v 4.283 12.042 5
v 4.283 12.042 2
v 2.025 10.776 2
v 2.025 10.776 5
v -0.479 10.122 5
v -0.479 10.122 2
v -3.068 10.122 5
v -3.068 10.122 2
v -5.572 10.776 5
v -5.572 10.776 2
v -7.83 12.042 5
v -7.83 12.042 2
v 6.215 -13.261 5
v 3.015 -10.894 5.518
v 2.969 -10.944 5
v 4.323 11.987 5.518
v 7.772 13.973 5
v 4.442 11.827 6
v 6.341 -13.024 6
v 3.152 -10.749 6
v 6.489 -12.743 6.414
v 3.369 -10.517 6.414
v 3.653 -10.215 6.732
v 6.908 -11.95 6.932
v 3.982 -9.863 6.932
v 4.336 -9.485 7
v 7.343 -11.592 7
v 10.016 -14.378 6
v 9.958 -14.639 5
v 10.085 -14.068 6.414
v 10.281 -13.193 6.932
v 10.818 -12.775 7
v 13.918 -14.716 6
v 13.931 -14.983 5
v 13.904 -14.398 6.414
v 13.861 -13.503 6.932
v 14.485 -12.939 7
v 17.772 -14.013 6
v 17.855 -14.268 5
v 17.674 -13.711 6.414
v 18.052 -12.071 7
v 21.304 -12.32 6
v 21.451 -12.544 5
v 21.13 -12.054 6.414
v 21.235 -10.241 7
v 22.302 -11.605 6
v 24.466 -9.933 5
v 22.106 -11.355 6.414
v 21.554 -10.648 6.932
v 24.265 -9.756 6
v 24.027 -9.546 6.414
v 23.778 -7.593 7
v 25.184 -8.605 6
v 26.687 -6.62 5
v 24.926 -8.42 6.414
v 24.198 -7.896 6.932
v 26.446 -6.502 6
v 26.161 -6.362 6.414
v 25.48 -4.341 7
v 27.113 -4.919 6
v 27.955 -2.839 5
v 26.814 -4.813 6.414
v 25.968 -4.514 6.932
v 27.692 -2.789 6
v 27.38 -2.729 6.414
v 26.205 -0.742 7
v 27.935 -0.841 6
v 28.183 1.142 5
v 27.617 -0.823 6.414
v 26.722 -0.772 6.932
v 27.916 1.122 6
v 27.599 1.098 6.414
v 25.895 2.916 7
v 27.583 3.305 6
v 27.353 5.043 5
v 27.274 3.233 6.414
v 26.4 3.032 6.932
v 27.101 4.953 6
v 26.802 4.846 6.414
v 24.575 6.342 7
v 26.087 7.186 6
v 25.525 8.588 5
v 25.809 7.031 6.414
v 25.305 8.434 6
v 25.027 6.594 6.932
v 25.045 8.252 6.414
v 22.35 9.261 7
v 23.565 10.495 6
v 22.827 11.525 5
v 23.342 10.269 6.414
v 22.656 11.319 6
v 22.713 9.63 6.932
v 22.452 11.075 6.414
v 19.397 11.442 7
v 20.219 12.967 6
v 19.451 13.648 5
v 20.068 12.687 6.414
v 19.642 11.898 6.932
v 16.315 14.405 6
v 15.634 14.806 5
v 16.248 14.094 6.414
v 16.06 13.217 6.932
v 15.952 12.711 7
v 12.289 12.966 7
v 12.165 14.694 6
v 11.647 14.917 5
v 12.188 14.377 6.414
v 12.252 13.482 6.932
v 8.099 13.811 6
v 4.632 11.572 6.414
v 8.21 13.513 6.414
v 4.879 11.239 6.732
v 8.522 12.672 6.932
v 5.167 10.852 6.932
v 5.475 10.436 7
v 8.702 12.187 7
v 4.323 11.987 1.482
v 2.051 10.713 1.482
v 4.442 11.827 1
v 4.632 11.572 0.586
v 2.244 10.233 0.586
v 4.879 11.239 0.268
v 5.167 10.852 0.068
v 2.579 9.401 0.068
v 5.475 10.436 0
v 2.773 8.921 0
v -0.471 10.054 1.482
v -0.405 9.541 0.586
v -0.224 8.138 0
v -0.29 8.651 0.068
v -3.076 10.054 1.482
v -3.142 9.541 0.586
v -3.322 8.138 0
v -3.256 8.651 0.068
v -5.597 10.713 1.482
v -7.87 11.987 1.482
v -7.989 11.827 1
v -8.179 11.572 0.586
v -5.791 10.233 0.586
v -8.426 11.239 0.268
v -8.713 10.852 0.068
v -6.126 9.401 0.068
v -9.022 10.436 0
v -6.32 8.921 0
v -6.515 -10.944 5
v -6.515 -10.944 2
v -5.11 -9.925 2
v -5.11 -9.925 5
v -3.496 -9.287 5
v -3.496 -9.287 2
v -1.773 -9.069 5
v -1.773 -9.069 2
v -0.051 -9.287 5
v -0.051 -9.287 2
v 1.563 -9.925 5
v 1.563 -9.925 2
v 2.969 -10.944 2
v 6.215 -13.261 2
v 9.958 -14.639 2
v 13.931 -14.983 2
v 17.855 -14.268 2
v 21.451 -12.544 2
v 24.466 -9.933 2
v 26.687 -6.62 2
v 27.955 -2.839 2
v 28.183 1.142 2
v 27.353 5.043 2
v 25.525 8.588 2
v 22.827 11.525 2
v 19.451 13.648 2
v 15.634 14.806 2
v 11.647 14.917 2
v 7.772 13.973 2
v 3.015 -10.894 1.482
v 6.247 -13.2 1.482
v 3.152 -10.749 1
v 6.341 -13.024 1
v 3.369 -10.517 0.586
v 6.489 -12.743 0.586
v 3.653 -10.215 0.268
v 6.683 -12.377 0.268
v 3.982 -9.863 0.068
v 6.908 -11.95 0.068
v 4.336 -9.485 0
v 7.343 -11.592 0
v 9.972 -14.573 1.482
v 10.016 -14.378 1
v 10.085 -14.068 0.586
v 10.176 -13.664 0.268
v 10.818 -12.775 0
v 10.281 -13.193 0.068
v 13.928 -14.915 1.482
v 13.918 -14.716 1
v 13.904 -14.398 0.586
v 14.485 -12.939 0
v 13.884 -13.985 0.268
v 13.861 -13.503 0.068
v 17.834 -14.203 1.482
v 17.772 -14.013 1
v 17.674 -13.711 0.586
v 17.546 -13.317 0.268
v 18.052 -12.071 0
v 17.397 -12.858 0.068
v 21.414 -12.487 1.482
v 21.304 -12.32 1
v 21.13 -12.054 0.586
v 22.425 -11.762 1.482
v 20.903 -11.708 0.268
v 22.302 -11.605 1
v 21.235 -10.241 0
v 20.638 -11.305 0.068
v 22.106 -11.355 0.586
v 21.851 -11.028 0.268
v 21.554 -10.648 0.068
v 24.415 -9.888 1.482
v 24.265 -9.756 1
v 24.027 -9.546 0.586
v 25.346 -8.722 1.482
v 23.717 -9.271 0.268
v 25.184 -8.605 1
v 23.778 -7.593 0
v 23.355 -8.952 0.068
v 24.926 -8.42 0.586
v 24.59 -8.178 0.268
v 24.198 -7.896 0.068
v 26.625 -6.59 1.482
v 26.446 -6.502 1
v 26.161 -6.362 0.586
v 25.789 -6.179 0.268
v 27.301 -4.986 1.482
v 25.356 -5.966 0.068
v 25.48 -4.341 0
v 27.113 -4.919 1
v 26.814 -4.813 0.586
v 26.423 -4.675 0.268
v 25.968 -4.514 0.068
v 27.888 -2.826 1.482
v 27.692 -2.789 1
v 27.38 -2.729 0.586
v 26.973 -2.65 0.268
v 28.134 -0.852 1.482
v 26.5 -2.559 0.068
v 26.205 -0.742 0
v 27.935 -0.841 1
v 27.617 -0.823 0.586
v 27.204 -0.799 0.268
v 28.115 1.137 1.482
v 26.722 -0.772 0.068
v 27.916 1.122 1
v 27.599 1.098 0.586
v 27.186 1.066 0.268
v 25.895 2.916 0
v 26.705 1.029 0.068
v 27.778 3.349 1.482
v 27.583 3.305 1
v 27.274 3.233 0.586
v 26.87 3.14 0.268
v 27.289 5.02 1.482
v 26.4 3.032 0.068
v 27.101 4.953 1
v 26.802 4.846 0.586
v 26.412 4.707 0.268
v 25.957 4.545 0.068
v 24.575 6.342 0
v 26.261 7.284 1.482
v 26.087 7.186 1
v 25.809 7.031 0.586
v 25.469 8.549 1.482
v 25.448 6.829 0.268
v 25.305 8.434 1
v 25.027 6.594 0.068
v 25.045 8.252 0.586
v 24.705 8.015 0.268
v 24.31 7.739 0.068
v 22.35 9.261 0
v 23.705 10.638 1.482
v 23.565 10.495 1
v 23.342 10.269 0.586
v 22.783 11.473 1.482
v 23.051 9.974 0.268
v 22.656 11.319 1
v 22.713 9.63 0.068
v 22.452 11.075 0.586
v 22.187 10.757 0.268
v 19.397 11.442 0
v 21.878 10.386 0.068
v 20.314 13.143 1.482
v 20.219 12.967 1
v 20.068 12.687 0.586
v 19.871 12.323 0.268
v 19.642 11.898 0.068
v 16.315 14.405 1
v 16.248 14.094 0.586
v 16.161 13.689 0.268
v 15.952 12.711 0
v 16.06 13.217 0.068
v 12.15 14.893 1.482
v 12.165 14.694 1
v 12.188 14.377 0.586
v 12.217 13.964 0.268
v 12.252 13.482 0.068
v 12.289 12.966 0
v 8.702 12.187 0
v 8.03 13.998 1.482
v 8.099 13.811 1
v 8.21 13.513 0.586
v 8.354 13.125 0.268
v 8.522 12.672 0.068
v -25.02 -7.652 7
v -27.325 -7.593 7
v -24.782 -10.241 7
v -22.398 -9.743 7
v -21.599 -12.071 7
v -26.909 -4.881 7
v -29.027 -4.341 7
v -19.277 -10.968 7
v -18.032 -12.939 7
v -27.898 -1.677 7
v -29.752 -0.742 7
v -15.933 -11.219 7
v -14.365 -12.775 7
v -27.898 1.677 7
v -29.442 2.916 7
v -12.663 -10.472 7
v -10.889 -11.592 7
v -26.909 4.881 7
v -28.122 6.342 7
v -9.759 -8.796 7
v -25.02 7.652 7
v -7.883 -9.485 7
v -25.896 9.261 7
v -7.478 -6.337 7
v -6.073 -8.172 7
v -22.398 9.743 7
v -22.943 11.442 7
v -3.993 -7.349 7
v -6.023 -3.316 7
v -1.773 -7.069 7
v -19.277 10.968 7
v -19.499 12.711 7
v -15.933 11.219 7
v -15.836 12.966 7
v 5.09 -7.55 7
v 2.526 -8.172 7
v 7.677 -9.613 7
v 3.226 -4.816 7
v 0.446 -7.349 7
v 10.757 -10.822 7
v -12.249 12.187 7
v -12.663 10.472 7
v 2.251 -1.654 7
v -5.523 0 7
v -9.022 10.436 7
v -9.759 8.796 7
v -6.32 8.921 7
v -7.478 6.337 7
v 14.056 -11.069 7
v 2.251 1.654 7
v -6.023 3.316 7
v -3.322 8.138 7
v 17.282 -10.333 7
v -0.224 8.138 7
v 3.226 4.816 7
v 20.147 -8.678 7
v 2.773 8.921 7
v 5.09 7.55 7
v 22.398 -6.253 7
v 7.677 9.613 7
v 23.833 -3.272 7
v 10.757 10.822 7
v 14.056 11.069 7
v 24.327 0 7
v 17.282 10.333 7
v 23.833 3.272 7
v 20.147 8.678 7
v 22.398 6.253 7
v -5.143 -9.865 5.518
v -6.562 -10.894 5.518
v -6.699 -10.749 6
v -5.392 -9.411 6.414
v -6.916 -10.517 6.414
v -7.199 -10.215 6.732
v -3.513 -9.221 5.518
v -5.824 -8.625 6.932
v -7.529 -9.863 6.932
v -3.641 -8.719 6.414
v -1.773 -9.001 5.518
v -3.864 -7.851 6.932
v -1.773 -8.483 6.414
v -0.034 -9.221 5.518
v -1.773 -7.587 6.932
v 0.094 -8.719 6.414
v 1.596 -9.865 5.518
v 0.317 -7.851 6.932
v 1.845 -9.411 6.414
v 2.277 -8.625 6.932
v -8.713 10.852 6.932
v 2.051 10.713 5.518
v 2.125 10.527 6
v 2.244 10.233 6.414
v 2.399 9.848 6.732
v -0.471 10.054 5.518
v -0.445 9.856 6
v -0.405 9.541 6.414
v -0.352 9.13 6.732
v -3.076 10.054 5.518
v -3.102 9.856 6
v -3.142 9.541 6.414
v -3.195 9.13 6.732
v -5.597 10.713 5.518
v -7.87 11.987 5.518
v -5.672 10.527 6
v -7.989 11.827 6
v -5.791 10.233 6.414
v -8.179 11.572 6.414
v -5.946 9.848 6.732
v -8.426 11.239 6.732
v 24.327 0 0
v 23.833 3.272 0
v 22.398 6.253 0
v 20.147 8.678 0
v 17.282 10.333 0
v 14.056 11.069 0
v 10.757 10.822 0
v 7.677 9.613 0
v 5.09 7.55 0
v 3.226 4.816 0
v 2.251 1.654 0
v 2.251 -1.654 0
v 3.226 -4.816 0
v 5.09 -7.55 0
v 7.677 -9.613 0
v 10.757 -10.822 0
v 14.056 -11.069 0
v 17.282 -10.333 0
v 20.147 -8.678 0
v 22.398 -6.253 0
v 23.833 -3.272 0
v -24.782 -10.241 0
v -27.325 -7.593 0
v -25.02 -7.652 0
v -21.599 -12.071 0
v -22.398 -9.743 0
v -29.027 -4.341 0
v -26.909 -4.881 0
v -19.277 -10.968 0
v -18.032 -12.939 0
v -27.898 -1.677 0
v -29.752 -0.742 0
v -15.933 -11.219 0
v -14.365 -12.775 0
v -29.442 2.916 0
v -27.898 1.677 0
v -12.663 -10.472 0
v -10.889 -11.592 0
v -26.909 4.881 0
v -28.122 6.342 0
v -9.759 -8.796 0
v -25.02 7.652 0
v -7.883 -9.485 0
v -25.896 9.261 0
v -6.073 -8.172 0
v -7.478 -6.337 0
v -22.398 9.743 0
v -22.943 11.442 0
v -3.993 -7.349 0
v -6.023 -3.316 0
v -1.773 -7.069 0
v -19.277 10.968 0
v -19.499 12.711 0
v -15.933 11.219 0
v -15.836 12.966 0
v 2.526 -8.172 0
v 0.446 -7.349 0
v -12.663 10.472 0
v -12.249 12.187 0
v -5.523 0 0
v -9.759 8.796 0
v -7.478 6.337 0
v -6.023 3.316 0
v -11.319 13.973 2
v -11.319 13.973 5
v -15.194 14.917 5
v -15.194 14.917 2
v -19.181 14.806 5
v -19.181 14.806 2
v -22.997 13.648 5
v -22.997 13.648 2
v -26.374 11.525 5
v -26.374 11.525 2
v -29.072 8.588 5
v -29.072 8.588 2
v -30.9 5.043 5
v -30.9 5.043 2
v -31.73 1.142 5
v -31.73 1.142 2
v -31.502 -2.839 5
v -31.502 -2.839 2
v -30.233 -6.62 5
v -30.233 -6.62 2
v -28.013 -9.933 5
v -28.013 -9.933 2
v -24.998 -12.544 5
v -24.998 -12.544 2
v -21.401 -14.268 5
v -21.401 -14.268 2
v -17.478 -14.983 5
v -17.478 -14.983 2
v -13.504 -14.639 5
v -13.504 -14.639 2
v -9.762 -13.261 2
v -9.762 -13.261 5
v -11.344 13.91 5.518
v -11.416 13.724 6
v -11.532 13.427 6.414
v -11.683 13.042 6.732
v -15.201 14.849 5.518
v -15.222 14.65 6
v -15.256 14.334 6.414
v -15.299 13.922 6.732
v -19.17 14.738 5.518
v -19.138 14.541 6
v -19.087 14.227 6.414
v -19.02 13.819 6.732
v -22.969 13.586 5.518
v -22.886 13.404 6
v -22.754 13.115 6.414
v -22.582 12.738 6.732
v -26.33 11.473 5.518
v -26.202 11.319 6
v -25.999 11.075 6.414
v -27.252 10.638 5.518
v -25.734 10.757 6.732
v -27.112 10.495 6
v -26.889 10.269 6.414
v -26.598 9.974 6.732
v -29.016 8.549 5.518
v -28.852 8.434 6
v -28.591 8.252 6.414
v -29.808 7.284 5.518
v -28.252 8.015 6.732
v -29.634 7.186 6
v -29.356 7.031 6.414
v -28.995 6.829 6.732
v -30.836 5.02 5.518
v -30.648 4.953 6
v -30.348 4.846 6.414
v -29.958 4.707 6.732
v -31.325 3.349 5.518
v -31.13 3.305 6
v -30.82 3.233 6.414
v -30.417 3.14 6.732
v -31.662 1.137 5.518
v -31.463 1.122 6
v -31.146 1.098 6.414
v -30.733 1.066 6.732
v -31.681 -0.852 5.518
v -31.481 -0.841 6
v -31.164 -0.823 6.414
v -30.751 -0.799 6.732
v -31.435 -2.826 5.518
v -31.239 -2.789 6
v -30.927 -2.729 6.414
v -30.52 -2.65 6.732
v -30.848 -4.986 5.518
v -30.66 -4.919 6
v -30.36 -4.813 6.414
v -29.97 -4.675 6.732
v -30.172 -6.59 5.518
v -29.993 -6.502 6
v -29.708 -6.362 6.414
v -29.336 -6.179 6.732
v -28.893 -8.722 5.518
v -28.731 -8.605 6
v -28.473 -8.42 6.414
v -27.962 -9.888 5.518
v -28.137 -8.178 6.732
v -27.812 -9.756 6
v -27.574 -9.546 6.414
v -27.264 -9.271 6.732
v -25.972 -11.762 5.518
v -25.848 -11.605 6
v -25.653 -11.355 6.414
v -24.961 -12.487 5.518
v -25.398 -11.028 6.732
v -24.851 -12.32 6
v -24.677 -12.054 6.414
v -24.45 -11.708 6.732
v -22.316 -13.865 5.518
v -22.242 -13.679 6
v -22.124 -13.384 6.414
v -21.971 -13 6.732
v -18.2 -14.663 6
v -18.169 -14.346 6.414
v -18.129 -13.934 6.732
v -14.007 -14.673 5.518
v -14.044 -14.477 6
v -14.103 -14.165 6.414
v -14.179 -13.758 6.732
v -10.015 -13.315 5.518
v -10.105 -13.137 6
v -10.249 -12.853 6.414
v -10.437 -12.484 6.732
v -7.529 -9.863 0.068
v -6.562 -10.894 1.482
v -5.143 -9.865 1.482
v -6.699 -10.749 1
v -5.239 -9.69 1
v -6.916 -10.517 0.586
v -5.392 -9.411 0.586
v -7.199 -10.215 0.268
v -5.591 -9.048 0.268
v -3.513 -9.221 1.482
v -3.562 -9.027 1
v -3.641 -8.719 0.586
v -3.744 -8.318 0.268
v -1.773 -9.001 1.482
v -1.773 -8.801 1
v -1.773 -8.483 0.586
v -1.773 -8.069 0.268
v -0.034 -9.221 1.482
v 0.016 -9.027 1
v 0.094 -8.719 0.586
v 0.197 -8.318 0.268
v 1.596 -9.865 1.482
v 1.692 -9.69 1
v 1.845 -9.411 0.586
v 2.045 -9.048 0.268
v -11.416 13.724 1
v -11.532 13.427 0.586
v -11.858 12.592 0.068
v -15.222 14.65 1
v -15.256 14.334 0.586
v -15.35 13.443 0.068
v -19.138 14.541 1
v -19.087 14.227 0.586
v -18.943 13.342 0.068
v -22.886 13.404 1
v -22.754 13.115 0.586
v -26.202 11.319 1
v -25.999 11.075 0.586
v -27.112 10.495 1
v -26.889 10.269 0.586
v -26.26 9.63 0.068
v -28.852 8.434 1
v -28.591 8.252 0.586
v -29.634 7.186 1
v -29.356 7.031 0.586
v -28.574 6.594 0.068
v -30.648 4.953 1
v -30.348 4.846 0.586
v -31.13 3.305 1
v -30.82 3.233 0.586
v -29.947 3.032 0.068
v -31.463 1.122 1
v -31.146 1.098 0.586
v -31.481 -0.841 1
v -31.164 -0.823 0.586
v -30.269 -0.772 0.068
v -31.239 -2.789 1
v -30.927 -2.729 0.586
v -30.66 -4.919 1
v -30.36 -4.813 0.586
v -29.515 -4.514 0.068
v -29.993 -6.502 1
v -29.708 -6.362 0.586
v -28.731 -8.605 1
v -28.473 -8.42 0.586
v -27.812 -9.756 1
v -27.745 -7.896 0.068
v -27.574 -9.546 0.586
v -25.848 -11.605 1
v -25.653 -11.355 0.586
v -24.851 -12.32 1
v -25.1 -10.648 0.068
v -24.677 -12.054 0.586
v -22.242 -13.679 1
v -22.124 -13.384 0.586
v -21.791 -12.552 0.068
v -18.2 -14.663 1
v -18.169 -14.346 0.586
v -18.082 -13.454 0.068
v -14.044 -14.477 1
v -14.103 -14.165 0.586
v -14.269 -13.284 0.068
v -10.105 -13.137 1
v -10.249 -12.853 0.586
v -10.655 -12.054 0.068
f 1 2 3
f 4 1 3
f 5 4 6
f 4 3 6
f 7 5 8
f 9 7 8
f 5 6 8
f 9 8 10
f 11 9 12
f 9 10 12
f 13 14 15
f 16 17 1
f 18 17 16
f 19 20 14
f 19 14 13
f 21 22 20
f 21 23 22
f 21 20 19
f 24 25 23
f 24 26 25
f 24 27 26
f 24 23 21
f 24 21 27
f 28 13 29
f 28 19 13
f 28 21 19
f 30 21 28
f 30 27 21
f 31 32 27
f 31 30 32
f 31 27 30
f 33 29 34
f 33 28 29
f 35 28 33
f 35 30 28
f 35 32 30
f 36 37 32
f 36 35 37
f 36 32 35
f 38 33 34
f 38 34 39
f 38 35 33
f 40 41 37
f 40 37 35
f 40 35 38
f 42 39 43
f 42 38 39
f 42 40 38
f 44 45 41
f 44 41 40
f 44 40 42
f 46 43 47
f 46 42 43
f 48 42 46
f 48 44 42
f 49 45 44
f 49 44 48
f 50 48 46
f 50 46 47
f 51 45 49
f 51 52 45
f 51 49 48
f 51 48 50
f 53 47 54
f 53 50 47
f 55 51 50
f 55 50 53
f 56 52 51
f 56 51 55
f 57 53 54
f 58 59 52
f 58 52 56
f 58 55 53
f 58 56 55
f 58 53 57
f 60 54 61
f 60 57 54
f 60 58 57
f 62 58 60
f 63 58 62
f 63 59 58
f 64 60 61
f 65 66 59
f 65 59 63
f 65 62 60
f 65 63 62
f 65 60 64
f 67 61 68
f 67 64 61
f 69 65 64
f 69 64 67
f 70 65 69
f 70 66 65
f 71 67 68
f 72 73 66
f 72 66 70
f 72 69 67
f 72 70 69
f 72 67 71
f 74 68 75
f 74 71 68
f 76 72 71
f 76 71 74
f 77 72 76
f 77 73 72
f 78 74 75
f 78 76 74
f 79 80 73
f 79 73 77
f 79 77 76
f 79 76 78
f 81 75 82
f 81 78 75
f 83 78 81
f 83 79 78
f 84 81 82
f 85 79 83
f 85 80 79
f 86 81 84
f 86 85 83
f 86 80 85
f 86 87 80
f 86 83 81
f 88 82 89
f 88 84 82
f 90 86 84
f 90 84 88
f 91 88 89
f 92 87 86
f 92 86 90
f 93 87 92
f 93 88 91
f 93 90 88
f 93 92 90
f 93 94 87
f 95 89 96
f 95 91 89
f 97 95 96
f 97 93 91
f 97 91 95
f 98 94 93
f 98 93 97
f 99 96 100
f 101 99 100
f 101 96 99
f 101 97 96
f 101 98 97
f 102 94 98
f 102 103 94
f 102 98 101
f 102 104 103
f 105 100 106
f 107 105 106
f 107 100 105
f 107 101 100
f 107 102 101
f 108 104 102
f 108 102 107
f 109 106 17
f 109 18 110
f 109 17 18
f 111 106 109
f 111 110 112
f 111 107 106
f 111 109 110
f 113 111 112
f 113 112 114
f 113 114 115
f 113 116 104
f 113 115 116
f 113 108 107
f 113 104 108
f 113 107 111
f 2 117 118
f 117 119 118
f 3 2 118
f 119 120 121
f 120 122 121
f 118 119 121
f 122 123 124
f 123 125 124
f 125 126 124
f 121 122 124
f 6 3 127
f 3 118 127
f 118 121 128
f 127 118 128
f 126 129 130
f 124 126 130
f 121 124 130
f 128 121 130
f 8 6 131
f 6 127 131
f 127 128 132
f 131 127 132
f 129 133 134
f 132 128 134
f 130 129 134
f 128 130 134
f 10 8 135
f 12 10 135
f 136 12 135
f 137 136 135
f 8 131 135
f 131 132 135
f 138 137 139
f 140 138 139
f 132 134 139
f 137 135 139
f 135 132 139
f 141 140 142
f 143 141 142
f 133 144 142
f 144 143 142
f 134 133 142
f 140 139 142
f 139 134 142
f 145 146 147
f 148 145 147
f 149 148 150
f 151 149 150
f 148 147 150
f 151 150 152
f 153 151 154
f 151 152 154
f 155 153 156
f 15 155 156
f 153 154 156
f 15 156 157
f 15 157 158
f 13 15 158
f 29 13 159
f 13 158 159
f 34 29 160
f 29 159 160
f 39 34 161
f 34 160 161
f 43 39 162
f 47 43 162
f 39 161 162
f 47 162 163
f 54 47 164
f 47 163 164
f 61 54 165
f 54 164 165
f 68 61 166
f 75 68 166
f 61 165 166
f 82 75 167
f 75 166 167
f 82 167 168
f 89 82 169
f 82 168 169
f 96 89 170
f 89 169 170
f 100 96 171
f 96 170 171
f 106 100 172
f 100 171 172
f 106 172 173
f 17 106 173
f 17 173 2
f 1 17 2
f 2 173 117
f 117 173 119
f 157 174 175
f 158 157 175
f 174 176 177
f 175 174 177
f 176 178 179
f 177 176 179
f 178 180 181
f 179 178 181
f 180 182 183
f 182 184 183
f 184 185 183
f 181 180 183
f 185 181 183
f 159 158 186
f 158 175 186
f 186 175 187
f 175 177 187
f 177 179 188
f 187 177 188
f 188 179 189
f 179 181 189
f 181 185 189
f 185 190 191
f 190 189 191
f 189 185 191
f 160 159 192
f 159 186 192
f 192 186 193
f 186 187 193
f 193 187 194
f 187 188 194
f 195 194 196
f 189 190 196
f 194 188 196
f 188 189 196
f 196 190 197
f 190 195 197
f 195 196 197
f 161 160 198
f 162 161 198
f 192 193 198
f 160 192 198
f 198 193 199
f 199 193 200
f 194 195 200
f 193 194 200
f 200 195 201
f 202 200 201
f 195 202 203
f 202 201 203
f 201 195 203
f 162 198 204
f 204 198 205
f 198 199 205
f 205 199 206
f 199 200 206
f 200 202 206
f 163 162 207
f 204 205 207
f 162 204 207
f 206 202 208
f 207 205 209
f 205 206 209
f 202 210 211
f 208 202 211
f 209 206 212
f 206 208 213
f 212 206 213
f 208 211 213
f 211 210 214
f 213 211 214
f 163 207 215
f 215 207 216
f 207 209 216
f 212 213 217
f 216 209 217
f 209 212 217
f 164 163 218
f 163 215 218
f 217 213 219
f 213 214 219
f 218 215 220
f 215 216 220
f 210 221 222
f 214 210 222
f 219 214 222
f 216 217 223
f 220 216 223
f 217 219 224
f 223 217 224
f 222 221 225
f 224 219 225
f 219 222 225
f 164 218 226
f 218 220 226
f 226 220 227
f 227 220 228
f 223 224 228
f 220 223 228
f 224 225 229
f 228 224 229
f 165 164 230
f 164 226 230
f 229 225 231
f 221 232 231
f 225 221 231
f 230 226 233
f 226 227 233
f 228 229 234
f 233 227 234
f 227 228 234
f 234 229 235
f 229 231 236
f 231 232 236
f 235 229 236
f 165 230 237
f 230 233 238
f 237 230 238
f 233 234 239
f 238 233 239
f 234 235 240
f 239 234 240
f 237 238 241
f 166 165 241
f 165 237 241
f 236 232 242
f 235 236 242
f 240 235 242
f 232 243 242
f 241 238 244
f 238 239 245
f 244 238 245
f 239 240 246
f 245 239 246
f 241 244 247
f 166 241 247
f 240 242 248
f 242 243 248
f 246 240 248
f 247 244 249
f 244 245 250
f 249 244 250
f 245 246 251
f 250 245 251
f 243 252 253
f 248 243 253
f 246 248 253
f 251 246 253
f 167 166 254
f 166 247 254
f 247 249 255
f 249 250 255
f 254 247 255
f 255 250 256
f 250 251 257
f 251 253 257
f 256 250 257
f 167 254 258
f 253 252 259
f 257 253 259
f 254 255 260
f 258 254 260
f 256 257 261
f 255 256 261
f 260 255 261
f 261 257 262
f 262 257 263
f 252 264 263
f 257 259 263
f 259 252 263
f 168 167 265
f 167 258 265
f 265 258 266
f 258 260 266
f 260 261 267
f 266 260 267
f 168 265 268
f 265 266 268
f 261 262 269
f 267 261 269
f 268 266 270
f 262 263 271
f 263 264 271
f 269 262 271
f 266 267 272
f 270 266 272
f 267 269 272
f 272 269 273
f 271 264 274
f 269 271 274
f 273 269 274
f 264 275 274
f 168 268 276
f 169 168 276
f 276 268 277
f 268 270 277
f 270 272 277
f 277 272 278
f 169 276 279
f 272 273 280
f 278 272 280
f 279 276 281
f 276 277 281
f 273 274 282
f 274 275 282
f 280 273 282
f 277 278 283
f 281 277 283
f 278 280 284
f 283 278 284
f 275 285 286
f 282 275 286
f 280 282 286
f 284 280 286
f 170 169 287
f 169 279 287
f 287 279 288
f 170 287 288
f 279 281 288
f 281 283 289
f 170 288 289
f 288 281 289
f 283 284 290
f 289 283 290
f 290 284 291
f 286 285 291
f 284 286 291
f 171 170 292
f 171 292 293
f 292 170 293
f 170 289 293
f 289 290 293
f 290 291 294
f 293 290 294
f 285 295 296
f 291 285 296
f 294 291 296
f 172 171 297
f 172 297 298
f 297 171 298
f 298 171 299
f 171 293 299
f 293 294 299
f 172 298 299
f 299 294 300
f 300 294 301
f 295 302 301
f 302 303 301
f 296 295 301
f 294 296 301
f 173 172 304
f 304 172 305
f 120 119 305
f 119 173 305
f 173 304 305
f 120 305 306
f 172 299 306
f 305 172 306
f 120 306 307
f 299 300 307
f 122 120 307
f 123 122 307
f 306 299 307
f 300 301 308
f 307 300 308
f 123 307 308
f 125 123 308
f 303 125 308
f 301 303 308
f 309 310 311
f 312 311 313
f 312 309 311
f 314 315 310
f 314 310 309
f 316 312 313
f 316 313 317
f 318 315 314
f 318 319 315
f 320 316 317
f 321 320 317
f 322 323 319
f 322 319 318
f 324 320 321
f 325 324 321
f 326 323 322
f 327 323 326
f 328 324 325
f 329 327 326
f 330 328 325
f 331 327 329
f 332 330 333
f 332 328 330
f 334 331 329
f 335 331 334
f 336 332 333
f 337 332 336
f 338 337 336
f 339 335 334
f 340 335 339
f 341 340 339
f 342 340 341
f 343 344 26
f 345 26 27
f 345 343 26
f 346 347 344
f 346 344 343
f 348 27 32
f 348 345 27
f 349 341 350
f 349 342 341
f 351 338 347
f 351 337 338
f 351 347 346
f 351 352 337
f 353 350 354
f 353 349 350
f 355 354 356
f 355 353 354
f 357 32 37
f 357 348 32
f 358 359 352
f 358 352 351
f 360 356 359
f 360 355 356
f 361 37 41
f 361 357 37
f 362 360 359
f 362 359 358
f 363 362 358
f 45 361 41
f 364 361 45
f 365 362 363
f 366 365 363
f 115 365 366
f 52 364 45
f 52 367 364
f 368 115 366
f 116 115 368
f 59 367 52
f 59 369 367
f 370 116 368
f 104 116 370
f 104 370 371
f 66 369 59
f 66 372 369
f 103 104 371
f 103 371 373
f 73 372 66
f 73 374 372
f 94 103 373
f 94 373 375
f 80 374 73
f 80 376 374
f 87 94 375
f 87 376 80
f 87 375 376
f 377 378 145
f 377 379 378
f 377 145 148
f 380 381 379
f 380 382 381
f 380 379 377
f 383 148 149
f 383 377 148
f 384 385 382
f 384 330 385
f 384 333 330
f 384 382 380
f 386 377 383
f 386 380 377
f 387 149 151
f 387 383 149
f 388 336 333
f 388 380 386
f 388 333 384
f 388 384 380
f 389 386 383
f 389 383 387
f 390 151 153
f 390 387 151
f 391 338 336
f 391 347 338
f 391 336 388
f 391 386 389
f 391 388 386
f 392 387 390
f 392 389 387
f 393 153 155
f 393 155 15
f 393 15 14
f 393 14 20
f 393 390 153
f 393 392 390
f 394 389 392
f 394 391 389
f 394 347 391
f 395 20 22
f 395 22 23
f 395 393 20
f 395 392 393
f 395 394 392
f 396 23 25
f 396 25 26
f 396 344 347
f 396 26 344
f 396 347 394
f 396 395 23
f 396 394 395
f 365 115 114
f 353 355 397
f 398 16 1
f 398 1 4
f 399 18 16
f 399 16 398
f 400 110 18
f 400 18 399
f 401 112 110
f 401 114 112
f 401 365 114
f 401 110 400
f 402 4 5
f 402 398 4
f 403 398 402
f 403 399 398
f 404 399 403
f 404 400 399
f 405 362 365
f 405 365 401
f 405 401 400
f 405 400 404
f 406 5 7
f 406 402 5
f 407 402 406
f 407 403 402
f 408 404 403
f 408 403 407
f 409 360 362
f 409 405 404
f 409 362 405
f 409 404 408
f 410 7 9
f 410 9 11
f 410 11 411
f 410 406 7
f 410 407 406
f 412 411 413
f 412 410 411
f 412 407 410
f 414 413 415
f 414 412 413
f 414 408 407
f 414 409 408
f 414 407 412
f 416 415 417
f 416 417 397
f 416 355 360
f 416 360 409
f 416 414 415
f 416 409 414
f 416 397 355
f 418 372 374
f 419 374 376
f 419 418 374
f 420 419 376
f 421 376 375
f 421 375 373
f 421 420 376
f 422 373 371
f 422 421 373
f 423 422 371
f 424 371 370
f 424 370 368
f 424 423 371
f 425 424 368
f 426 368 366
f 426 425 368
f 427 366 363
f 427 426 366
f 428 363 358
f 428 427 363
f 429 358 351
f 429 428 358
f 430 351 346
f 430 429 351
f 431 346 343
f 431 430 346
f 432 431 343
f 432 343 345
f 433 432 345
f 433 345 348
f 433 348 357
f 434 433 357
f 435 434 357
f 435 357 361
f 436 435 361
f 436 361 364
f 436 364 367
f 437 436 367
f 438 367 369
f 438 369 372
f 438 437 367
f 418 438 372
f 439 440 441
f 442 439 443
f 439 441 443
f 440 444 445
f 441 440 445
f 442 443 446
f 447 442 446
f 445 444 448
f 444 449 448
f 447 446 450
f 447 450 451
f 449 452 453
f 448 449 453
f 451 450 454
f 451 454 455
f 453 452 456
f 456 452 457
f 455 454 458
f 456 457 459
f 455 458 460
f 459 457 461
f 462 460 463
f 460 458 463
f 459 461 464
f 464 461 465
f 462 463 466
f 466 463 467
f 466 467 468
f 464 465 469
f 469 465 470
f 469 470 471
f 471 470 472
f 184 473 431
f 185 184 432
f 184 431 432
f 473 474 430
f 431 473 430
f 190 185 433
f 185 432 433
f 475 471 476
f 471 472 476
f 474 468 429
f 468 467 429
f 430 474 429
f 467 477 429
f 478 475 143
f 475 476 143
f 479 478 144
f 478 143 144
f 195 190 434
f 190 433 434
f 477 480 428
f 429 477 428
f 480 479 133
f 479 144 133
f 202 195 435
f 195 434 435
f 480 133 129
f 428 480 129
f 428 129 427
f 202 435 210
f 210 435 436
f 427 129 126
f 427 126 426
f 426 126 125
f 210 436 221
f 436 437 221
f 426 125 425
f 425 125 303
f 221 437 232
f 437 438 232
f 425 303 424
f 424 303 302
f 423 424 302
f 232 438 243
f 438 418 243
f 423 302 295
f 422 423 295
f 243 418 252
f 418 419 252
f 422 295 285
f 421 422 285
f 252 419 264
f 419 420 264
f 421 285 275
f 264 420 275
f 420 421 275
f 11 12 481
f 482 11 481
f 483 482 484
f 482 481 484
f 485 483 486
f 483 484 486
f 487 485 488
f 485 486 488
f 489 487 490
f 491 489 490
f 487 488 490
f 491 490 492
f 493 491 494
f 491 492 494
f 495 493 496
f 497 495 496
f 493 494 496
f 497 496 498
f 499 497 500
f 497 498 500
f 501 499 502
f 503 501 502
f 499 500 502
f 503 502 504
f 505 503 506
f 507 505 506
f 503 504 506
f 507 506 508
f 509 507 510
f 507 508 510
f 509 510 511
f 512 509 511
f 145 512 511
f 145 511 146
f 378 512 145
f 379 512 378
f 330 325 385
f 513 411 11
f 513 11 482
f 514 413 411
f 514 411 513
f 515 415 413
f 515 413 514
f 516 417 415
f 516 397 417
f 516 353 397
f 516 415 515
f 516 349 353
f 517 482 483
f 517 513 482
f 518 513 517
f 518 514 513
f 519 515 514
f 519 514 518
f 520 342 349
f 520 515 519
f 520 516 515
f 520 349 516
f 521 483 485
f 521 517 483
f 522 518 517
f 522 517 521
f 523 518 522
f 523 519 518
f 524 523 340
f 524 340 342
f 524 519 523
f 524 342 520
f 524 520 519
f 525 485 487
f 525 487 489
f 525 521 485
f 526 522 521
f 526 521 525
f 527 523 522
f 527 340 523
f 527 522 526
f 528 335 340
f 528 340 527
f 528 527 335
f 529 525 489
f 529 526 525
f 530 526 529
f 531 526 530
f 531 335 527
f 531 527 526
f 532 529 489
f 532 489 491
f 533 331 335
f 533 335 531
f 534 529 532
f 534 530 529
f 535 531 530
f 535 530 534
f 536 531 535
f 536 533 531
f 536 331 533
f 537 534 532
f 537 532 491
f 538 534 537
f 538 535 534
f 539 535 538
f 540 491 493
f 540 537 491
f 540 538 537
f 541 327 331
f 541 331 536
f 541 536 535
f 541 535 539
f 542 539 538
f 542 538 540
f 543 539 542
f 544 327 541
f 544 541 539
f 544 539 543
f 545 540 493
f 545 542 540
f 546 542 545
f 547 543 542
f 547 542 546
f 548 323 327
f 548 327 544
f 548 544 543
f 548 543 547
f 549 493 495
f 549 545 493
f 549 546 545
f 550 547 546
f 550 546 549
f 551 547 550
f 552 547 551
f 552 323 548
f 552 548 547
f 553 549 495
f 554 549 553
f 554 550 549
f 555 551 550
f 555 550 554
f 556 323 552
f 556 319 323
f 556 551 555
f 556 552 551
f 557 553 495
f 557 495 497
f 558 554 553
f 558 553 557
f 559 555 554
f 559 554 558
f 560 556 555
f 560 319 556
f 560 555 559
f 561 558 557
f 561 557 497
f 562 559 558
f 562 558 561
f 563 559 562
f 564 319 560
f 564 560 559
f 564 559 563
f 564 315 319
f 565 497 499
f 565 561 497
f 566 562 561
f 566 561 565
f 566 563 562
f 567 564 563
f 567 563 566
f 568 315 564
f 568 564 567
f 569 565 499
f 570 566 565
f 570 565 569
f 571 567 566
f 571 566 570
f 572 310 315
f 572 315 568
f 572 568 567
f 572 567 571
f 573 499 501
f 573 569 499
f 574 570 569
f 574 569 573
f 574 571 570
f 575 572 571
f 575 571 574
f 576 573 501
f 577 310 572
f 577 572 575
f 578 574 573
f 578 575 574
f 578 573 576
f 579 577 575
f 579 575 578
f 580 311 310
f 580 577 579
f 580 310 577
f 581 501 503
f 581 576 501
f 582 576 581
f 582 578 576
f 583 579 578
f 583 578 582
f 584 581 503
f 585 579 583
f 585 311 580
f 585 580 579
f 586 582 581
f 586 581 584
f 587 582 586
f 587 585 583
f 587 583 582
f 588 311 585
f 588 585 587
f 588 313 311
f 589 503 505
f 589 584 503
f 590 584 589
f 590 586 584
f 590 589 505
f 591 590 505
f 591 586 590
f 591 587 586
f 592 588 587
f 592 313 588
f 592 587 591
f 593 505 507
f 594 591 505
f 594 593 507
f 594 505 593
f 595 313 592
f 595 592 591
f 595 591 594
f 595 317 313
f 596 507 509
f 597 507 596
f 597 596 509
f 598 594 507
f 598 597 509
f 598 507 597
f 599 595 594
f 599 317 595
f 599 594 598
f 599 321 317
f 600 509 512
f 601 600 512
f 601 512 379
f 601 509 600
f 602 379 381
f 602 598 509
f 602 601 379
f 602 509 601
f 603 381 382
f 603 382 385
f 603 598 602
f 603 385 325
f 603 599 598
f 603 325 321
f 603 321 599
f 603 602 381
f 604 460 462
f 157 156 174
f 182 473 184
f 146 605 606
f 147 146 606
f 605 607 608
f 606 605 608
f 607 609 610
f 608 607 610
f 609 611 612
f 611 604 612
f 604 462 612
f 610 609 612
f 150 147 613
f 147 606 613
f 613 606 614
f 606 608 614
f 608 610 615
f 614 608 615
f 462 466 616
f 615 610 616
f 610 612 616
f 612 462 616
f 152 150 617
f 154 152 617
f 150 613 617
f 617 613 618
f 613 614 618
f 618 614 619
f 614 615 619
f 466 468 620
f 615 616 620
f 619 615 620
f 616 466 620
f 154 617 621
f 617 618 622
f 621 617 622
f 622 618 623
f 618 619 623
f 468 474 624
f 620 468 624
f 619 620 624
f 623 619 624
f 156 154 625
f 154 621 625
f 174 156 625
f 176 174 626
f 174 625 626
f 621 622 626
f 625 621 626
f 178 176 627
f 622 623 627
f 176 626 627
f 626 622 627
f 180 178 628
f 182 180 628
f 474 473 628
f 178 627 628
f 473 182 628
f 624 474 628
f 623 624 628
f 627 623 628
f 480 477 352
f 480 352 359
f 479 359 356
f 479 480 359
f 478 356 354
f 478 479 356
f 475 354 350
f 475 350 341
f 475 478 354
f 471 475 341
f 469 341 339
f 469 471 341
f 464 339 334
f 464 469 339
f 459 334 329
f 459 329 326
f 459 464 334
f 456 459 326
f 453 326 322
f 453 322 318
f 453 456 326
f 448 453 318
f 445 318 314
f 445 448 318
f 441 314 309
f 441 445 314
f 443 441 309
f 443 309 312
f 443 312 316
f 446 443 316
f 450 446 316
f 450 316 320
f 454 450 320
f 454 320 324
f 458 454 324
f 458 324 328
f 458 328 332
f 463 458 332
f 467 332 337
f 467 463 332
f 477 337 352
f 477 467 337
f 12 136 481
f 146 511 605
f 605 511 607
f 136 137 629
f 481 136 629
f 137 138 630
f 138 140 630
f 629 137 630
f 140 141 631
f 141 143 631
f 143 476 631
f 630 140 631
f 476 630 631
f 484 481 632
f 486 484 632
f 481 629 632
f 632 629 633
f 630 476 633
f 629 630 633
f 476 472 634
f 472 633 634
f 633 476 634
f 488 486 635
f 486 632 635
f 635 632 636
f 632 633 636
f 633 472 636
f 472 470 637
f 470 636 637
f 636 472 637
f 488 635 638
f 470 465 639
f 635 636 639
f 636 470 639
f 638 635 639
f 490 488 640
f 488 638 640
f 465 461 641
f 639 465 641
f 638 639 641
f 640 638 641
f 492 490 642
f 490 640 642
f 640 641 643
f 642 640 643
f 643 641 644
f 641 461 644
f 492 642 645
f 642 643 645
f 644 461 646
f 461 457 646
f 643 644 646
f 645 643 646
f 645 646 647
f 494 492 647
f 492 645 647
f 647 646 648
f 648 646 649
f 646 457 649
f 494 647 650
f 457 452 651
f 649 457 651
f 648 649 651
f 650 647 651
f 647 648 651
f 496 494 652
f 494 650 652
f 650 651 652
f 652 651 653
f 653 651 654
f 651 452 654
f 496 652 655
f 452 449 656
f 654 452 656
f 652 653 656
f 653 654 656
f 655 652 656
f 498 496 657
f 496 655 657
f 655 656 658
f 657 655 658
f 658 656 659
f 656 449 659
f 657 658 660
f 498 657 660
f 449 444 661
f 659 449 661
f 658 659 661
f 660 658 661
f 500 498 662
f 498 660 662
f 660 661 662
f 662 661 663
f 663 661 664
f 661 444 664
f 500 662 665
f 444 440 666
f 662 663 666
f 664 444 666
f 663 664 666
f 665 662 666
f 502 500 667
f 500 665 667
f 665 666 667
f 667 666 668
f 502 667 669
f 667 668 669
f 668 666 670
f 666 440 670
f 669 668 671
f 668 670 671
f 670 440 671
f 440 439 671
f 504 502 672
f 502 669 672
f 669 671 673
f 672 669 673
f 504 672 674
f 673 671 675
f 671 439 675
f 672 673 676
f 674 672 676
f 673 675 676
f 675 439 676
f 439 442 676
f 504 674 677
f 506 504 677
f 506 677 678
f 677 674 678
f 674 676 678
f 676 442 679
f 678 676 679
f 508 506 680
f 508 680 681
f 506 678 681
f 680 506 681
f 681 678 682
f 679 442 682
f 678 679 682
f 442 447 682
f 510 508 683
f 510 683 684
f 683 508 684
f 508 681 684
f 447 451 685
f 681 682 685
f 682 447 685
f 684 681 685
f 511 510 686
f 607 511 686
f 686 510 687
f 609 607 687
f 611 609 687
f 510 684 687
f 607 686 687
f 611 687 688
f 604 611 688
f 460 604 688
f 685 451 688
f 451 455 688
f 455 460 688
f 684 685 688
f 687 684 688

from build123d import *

# Parameters (mm, degrees)
F0_R     = 11.25
F0_R_2   = 11.1
F1_DEPTH = 7
F2_R     = 2


with BuildPart() as f1:
    # F0 (on Top) → F1 (new body)
    with BuildSketch(Plane.XY):
        with BuildLine():
            ThreePointArc((4.282726, 12.041891), (-1.773401, 10.038879), (-7.829528, 12.041891))
            ThreePointArc((-7.829528, 12.041891), (-31.74895, -0.85611), (-6.51548, -10.944179))
            ThreePointArc((-6.51548, -10.944179), (-1.773401, -9.069235), (2.968677, -10.944179))
            ThreePointArc((2.968677, -10.944179), (28.202148, -0.85611), (4.282726, 12.041891))
        make_face()
        with Locations((-16.773401, 0)):
            Circle(F0_R, mode=Mode.SUBTRACT)
        with Locations((13.226599, 0)):
            Circle(F0_R_2, mode=Mode.SUBTRACT)
    extrude(amount=F1_DEPTH)

    # F2
    f2_edges = [f1.edges().sort_by_distance(p)[0] for p in [
        (-31.74895, -0.85611, 0),
        (28.202148, -0.85611, 7),
    ]]
    fillet(f2_edges, radius=F2_R)


solid = f1.part
